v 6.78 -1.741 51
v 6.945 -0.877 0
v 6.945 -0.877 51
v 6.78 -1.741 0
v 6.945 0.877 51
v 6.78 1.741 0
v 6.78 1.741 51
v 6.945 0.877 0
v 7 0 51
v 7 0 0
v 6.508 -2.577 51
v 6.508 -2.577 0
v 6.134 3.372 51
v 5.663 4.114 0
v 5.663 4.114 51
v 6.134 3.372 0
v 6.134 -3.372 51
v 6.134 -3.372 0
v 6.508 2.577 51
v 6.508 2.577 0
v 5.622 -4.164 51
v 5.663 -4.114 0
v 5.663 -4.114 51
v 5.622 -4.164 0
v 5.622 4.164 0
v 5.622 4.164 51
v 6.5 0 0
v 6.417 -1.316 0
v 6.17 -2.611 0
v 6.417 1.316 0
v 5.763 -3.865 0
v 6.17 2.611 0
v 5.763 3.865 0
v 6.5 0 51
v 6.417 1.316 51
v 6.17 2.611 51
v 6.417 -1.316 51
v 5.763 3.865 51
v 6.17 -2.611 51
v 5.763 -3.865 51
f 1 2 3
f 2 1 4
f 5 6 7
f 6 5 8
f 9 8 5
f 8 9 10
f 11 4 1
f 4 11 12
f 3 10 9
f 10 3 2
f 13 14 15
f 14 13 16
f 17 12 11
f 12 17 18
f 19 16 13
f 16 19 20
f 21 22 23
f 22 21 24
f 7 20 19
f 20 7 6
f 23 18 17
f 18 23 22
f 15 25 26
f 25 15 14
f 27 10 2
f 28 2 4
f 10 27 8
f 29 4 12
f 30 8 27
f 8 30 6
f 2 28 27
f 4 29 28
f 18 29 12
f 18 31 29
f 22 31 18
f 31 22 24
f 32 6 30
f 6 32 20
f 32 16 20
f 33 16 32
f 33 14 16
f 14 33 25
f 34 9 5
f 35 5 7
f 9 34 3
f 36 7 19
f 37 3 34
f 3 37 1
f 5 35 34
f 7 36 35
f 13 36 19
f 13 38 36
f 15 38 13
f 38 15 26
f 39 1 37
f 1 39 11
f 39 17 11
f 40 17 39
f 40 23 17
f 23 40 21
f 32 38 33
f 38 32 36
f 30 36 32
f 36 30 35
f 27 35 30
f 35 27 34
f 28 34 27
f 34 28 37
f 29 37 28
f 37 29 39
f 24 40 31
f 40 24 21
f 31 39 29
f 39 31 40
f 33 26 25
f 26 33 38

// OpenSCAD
$fn = 50;


difference() {
	union() {
		cylinder(h = 51, r = 7.0000000000);
		translate(v = [-7.0000000000, 0, 0]) {
			cylinder(h = 51, r = 7.0000000000);
		}
	}
	union() {
		cylinder(h = 51, r = 3.2500000000);
		cylinder(h = 51, r = 1.8000000000);
		cylinder(h = 51, r = 1.8000000000);
		cylinder(h = 51, r = 1.8000000000);
		translate(v = [-11.5000000000, 0, 0]) {
			hull() {
				translate(v = [-3.7500000000, 0.0000000000, 0]) {
					cylinder(h = 51, r = 7.5000000000);
				}
				translate(v = [3.7500000000, 0.0000000000, 0]) {
					cylinder(h = 51, r = 7.5000000000);
				}
				translate(v = [-3.7500000000, -0.0000000000, 0]) {
					cylinder(h = 51, r = 7.5000000000);
				}
				translate(v = [3.7500000000, -0.0000000000, 0]) {
					cylinder(h = 51, r = 7.5000000000);
				}
			}
		}
		translate(v = [-4.0000000000, 0, 0.0000000000]) {
			cylinder(h = 51, r = 10.5000000000);
		}
	}
}
